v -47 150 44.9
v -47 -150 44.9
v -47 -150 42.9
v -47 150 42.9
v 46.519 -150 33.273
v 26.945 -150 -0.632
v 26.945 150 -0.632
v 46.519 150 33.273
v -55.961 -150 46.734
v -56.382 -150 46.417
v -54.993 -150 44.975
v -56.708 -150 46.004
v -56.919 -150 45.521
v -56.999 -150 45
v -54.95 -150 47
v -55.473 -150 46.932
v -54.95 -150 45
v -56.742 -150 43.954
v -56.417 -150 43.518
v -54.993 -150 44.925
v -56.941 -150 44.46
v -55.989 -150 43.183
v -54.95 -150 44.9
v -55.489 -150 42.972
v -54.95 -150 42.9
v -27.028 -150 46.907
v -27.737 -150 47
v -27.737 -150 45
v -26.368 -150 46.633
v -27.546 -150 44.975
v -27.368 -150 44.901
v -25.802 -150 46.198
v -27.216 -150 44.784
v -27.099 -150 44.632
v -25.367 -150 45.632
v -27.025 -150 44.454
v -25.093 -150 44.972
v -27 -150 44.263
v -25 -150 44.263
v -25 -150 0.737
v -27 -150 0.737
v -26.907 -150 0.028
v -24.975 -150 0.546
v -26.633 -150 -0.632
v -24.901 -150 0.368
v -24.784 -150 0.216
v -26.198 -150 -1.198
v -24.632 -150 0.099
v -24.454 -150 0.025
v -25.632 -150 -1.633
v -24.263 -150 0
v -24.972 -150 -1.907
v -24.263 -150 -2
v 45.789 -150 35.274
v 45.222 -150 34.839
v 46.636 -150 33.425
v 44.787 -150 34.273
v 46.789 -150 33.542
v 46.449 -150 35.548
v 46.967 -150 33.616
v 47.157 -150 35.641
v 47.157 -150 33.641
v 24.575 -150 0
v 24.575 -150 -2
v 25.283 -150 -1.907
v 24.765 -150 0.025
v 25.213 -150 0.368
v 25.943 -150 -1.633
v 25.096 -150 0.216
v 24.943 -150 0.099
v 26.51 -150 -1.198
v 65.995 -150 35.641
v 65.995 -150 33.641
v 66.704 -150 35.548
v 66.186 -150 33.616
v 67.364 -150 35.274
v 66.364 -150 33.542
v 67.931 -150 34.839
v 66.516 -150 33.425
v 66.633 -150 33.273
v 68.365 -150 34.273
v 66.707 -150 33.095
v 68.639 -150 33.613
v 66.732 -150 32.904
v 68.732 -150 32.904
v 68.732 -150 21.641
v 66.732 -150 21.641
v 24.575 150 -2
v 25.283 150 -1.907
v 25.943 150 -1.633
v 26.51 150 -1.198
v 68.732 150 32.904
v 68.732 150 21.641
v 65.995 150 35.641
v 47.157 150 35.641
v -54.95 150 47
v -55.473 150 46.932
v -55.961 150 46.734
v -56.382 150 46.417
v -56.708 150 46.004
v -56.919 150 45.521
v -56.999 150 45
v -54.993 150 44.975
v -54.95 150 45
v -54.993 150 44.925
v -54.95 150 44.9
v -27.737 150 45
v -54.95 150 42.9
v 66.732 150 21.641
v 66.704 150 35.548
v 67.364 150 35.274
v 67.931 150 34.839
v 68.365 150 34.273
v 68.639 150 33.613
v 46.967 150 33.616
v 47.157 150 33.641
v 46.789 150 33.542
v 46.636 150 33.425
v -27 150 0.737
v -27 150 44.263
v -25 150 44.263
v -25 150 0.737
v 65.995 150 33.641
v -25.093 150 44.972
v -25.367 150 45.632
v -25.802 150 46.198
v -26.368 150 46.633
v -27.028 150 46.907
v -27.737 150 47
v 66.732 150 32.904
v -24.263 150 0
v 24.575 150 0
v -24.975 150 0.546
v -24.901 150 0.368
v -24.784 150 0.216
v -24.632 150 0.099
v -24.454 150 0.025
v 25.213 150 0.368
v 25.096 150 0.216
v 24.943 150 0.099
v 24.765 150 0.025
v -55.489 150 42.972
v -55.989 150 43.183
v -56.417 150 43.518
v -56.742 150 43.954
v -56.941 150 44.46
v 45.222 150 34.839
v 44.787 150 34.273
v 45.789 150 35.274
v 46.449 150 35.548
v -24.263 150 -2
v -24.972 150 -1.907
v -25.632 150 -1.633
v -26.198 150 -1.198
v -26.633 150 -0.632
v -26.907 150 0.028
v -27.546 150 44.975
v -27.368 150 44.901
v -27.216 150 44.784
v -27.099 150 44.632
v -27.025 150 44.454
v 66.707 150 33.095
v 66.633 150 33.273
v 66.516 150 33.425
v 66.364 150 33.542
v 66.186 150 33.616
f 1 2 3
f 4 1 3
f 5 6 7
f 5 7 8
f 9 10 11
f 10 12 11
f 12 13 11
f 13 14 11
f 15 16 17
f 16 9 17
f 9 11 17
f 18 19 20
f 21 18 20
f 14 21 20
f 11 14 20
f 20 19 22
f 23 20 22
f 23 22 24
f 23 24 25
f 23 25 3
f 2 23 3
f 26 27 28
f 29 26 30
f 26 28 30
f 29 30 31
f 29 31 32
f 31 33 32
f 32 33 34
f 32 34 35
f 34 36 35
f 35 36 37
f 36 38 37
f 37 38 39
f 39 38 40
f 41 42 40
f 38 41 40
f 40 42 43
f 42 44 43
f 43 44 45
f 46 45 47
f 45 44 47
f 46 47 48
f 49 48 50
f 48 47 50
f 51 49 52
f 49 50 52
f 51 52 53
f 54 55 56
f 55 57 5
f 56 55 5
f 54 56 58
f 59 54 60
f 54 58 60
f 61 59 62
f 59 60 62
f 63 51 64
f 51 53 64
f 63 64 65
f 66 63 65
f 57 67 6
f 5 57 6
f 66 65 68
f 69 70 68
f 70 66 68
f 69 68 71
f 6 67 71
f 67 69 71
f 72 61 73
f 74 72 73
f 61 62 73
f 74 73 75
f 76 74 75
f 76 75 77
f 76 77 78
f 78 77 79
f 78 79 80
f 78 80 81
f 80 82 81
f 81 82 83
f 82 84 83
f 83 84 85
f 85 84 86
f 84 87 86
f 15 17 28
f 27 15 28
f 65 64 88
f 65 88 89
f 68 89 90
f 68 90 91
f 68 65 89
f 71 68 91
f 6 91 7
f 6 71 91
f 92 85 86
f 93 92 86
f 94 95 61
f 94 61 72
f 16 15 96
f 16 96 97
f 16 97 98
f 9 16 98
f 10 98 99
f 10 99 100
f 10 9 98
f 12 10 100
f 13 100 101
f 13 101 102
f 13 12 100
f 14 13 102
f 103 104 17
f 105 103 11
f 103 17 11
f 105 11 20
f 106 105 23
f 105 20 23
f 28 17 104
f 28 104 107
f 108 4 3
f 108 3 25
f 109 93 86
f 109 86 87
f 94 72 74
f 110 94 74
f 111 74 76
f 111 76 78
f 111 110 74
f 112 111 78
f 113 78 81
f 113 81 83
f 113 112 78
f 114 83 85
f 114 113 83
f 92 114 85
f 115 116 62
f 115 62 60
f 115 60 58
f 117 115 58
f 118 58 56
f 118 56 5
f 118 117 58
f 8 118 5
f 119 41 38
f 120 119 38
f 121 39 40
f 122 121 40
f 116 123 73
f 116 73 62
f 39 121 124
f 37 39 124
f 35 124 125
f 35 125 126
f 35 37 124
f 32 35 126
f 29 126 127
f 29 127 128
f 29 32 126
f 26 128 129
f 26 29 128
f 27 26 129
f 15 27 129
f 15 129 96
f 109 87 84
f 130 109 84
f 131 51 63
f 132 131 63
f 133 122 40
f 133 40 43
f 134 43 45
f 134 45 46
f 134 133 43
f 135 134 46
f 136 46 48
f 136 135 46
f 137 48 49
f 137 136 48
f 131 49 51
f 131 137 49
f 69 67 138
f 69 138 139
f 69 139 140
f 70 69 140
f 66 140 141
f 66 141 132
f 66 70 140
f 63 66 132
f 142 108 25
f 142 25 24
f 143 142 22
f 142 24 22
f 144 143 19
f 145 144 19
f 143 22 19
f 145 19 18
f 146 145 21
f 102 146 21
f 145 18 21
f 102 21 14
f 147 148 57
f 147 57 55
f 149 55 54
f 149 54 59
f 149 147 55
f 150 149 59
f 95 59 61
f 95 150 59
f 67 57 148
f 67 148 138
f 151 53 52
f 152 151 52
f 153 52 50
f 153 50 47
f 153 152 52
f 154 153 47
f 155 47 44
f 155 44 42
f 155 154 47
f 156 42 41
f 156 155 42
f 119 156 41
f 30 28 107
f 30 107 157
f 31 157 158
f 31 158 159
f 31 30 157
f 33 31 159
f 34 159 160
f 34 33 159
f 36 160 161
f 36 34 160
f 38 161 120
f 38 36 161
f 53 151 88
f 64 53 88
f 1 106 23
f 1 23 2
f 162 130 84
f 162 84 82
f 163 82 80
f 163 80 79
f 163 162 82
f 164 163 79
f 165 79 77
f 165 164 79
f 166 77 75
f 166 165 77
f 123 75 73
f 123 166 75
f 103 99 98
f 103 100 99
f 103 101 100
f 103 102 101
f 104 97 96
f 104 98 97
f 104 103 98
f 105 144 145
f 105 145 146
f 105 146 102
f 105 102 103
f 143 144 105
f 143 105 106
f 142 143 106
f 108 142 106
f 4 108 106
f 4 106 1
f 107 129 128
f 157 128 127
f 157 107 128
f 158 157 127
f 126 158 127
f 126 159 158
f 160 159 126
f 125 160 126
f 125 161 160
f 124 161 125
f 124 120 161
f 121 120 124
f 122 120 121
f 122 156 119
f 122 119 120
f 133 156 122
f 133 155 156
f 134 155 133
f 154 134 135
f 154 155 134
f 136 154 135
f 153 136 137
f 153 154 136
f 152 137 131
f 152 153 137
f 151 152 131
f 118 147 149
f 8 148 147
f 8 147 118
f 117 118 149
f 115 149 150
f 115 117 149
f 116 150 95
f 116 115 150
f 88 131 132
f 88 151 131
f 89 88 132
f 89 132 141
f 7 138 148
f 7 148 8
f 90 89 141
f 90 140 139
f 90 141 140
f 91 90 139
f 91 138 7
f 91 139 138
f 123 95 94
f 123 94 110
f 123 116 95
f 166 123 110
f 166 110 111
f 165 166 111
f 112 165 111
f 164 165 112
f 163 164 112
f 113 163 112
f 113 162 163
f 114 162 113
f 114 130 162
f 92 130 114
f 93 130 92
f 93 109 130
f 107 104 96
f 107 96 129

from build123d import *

# Parameters (mm, degrees)
SCHIZZO2_W                     = 50
SCHIZZO2_H                     = 300
BASE_FLANGIA2_DEPTH            = 2
BORDO_FLANGIA1_STRIP_W         = 9.4732
BORDO_FLANGIA1_STRIP_H         = 2
BORDO_FLANGIA1_STRIP_CUT_DEPTH = 300
BORDO_FLANGIA1_DEPTH           = 300
BORDO_FLANGIA2_STRIP_W         = 9.4732
BORDO_FLANGIA2_STRIP_H         = 2
BORDO_FLANGIA2_STRIP_CUT_DEPTH = 300
BORDO_FLANGIA2_DEPTH           = 300
BORDO_FLANGIA3_STRIP_CUT_DEPTH = 300
BORDO_FLANGIA3_DEPTH           = 300
BORDO_FLANGIA4_STRIP_CUT_DEPTH = 300
BORDO_FLANGIA4_DEPTH           = 300
BORDO_FLANGIA5_STRIP_W         = 9.4732
BORDO_FLANGIA5_STRIP_H         = 2
BORDO_FLANGIA5_STRIP_CUT_DEPTH = 300
BORDO_FLANGIA5_DEPTH           = 300
ORLO1_START                    = -150
ORLO1_DEPTH                    = 300
ORLO1_2_DEPTH                  = 300


# Read off the part's stored shape, not the designer's step: Orlo1
# Sheet-metal steps are written as plain solids
with BuildPart() as part:
    # Schizzo2 → Base-Flangia2 (new body)
    with BuildSketch(Plane.XY):
        Rectangle(SCHIZZO2_W, SCHIZZO2_H)
    extrude(amount=-BASE_FLANGIA2_DEPTH)

    # Bordo-Flangia1 strip (across the edge) → Bordo-Flangia1 strip cut (cut)
    with BuildSketch(Plane(origin=(-25, 150, 0), x_dir=(1, 0, 0), z_dir=(0, -1, 0))):
        with Locations((-4, -1)):
            Rectangle(BORDO_FLANGIA1_STRIP_W, BORDO_FLANGIA1_STRIP_H)
    extrude(amount=BORDO_FLANGIA1_STRIP_CUT_DEPTH, mode=Mode.SUBTRACT)

    # Bordo-Flangia1 section (across the edge) → Bordo-Flangia1 (add)
    with BuildSketch(Plane(origin=(-25, 150, 0), x_dir=(1, 0, 0), z_dir=(0, -1, 0))):
        with BuildLine():
            Line((-2, 0.7366), (-2, 45))
            Line((-2, 45), (0, 45))
            Line((0, 45), (0, 0.7366))
            ThreePointArc((0, 0.7366), (0.215745145, 0.215745145), (0.7366, 0))
            Line((0.7366, 0), (0.7366, -2))
            ThreePointArc((0.7366, -2), (-1.198468417, -1.198468417), (-2, 0.7366))
        make_face()
    extrude(amount=BORDO_FLANGIA1_DEPTH)

    # Bordo-Flangia2 strip (across the edge) → Bordo-Flangia2 strip cut (cut)
    with BuildSketch(Plane(origin=(-27, -150, 45), x_dir=(0, 0, -1), z_dir=(0, 1, 0))):
        with Locations((-4, -1)):
            Rectangle(BORDO_FLANGIA2_STRIP_W, BORDO_FLANGIA2_STRIP_H)
    extrude(amount=BORDO_FLANGIA2_STRIP_CUT_DEPTH, mode=Mode.SUBTRACT)

    # Bordo-Flangia2 section (across the edge) → Bordo-Flangia2 (add)
    with BuildSketch(Plane(origin=(-27, -150, 45), x_dir=(0, 0, -1), z_dir=(0, 1, 0))):
        with BuildLine():
            Line((-2, 0.7366), (-2, 30))
            Line((-2, 30), (0, 30))
            Line((0, 30), (0, 0.7366))
            ThreePointArc((0, 0.7366), (0.215745145, 0.215745145), (0.7366, 0))
            Line((0.7366, 0), (0.7366, -2))
            ThreePointArc((0.7366, -2), (-1.198468417, -1.198468417), (-2, 0.7366))
        make_face()
    extrude(amount=BORDO_FLANGIA2_DEPTH)

    # Bordo-Flangia3 strip (across the edge) → Bordo-Flangia3 strip cut (cut)
    with BuildSketch(Plane(origin=(25, -150, 0), x_dir=(-0.8660254037844364, 0, 0.5000000000000041), z_dir=(0, 1, 0))):
        Polygon((-8.835731855, 2.791911088), (-0.6317, -1.944688912), (0.3683, -0.212638104), (-7.835731855, 4.523961896), align=None)
    extrude(amount=BORDO_FLANGIA3_STRIP_CUT_DEPTH, mode=Mode.SUBTRACT)

    # Bordo-Flangia3 section (across the edge) → Bordo-Flangia3 (add)
    with BuildSketch(Plane(origin=(25, -150, 0), x_dir=(-0.8660254037844364, 0, 0.5000000000000041), z_dir=(0, 1, 0))):
        with BuildLine():
            Line((-2, 0.425276208), (-2, 40))
            Line((-2, 40), (0, 40))
            Line((0, 40), (0, 0.425276208))
            ThreePointArc((0, 0.425276208), (0.098685688, 0.056976208), (0.3683, -0.212638104))
            Line((0.3683, -0.212638104), (-0.6317, -1.944688912))
            ThreePointArc((-0.6317, -1.944688912), (-1.63336512, -0.943023792), (-2, 0.425276208))
        make_face()
    extrude(amount=BORDO_FLANGIA3_DEPTH)

    # Bordo-Flangia4 strip (across the edge) → Bordo-Flangia4 strip cut (cut)
    with BuildSketch(Plane(origin=(46.732050808, 150, 33.641016151), x_dir=(0, 0, -1), z_dir=(0, -1, 0))):
        Polygon((-8.835731855, 2.791911088), (-0.6317, -1.944688912), (0.3683, -0.212638104), (-7.835731855, 4.523961896), align=None)
    extrude(amount=BORDO_FLANGIA4_STRIP_CUT_DEPTH, mode=Mode.SUBTRACT)

    # Bordo-Flangia4 section (across the edge) → Bordo-Flangia4 (add)
    with BuildSketch(Plane(origin=(46.732050808, 150, 33.641016151), x_dir=(0, 0, -1), z_dir=(0, -1, 0))):
        with BuildLine():
            Line((-2, 0.425276208), (-2, 20))
            Line((-2, 20), (0, 20))
            Line((0, 20), (0, 0.425276208))
            ThreePointArc((0, 0.425276208), (0.098685688, 0.056976208), (0.3683, -0.212638104))
            Line((0.3683, -0.212638104), (-0.6317, -1.944688912))
            ThreePointArc((-0.6317, -1.944688912), (-1.63336512, -0.943023792), (-2, 0.425276208))
        make_face()
    extrude(amount=BORDO_FLANGIA4_DEPTH)

    # Bordo-Flangia5 strip (across the edge) → Bordo-Flangia5 strip cut (cut)
    with BuildSketch(Plane(origin=(66.732050808, 150, 33.641016151), x_dir=(-1, 0, 0), z_dir=(0, -1, 0))):
        with Locations((-4, -1)):
            Rectangle(BORDO_FLANGIA5_STRIP_W, BORDO_FLANGIA5_STRIP_H)
    extrude(amount=BORDO_FLANGIA5_STRIP_CUT_DEPTH, mode=Mode.SUBTRACT)

    # Bordo-Flangia5 section (across the edge) → Bordo-Flangia5 (add)
    with BuildSketch(Plane(origin=(66.732050808, 150, 33.641016151), x_dir=(-1, 0, 0), z_dir=(0, -1, 0))):
        with BuildLine():
            Line((-2, 0.7366), (-2, 12))
            Line((-2, 12), (0, 12))
            Line((0, 12), (0, 0.7366))
            ThreePointArc((0, 0.7366), (0.215745145, 0.215745145), (0.7366, 0))
            Line((0.7366, 0), (0.7366, -2))
            ThreePointArc((0.7366, -2), (-1.198468417, -1.198468417), (-2, 0.7366))
        make_face()
    extrude(amount=BORDO_FLANGIA5_DEPTH)

    # Orlo1 outline → Orlo1 (cut)
    with BuildSketch(Plane(origin=(0, 0, 0), x_dir=(1, 0, 0), z_dir=(0, 1, 0)).offset(ORLO1_START)):
        with BuildLine():
            ThreePointArc((-54.95, -47), (-56.381782106, -46.417140075), (-56.999390153, -45))
            Line((-56.999390153, -45), (-57, -45))
            Line((-57, -45), (-57, -47))
            Line((-57, -47), (-54.95, -47))
        make_face()
    extrude(amount=ORLO1_DEPTH, mode=Mode.SUBTRACT)

    # Orlo1 2 outline → Orlo1 2 (add)
    with BuildSketch(Plane(origin=(0, 0, 0), x_dir=(1, 0, 0), z_dir=(0, 1, 0)).offset(ORLO1_START)):
        with BuildLine():
            Line((-47, -44.9), (-47, -42.9))
            Line((-47, -42.9), (-54.95, -42.9))
            ThreePointArc((-54.95, -42.9), (-56.417140075, -43.518217894), (-56.999390153, -45))
            Line((-56.999390153, -45), (-54.95, -45))
            ThreePointArc((-54.95, -45), (-55, -44.95), (-54.95, -44.9))
            Line((-54.95, -44.9), (-47, -44.9))
        make_face()
    extrude(amount=ORLO1_2_DEPTH)


solid = part.part
